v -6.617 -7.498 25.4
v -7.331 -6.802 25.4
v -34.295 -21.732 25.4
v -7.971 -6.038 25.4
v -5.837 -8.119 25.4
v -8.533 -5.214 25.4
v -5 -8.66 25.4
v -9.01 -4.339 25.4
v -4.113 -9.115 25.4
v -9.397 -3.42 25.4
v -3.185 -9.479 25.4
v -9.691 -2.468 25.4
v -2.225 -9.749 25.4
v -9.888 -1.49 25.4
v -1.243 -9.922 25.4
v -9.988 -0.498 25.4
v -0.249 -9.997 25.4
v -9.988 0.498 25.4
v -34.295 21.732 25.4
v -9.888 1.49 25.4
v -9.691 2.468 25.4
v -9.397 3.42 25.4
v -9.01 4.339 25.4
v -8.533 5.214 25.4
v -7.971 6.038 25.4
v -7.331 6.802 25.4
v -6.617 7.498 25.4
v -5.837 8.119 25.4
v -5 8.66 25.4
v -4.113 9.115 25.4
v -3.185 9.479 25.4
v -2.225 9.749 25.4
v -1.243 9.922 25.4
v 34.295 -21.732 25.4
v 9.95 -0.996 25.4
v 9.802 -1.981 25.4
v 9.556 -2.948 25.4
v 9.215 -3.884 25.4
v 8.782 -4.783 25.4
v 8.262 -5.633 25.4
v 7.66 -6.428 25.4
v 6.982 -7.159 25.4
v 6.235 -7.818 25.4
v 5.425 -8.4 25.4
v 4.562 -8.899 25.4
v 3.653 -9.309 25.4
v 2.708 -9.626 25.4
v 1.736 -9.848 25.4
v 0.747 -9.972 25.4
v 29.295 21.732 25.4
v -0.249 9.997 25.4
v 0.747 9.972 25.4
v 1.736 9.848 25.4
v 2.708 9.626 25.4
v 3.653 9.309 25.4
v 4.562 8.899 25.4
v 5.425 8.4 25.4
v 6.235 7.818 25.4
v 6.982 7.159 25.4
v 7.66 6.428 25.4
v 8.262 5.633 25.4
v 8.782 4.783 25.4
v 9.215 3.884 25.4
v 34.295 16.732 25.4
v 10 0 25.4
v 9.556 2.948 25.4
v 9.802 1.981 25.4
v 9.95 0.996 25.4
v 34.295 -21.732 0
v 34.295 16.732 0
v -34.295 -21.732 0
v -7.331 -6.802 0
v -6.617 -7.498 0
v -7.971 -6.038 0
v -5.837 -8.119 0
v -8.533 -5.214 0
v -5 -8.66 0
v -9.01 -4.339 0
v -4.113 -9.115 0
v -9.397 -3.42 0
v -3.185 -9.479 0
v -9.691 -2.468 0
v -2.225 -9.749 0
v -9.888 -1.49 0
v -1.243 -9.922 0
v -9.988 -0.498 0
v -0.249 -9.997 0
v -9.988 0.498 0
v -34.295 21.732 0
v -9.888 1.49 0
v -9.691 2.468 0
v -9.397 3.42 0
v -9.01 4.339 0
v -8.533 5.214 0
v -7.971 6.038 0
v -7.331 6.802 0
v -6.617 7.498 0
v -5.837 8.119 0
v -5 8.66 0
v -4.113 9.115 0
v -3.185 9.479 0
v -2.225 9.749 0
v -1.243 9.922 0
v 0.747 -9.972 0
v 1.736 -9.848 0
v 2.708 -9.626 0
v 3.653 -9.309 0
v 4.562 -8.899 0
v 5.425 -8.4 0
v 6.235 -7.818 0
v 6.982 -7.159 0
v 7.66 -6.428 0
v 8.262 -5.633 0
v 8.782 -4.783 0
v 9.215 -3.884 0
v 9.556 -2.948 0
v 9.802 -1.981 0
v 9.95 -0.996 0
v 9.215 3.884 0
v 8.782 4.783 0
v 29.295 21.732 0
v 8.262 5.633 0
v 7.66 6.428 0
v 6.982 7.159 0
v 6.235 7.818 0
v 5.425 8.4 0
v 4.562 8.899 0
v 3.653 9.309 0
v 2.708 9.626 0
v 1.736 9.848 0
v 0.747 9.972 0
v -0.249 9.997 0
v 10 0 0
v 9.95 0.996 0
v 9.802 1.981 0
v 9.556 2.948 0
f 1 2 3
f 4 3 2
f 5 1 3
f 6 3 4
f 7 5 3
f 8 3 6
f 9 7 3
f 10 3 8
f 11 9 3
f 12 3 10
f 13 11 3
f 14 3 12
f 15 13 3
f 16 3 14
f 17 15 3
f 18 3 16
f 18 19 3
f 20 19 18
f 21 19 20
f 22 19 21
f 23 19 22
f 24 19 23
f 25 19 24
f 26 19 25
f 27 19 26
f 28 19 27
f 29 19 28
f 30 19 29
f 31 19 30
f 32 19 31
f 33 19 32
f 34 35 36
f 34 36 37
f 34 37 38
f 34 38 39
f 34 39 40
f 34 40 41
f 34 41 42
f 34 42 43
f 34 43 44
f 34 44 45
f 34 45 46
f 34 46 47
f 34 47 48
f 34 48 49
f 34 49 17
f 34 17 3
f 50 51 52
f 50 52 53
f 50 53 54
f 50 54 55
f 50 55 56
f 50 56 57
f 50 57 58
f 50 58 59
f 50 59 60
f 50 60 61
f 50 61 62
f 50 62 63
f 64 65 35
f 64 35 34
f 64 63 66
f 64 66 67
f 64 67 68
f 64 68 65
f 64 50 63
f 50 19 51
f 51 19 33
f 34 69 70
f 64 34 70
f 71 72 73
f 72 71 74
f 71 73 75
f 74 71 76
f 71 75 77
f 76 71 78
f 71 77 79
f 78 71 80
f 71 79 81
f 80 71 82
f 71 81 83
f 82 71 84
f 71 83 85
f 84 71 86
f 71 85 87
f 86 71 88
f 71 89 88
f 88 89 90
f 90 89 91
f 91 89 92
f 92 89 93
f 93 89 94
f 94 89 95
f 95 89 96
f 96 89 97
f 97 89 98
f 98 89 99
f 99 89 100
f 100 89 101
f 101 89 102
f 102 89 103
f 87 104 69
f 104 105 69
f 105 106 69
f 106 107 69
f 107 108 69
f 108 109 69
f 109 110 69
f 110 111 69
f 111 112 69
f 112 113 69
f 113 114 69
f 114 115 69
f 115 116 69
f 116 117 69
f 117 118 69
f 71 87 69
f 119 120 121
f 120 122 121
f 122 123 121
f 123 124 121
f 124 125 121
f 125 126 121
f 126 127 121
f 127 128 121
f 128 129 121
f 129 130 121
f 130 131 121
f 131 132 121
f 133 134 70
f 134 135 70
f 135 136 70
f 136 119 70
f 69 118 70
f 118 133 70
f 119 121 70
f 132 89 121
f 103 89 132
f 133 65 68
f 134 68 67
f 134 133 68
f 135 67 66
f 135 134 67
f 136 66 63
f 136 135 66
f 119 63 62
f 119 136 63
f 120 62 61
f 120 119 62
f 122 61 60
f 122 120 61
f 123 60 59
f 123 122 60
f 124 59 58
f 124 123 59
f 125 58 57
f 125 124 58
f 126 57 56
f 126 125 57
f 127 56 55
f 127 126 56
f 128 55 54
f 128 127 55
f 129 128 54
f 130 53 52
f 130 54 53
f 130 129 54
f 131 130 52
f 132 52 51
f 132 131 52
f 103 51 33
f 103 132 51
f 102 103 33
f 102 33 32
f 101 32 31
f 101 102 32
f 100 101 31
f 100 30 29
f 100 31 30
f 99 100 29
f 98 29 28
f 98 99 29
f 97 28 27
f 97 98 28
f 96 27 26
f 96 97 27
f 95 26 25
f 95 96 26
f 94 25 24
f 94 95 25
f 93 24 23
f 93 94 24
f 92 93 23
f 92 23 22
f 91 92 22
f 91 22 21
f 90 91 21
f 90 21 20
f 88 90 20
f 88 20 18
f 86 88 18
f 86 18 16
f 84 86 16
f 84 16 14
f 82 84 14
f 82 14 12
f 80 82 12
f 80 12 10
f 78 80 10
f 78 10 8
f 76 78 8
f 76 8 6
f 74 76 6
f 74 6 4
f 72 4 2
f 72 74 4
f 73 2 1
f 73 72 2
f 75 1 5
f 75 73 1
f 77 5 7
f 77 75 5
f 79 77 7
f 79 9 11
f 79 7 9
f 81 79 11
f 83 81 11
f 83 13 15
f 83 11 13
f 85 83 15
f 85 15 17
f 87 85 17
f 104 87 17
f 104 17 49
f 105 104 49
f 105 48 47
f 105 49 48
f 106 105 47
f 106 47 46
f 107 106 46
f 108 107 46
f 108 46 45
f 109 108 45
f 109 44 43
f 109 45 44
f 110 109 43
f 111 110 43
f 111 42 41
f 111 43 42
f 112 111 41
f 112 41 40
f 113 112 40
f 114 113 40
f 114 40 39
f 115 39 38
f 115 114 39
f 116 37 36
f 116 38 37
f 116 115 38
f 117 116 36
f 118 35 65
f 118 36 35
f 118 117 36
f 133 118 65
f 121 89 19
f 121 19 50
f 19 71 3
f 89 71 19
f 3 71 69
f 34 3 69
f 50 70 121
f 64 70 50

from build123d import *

# Parameters (mm, degrees)
F0_W     = 68.590634
F0_H     = 43.46339
F1_DEPTH = 25.4
F2_D     = 5
F3_R     = 10
F4_DEPTH = 25.401
F5_SIZE  = 5


with BuildPart() as f1:
    # F0 (on Top) → F1 (new body)
    with BuildSketch(Plane.XY):
        Rectangle(F0_W, F0_H)
    extrude(amount=F1_DEPTH)

    # F2 (through all)
    with Locations(Plane(origin=(0, 0, 0), x_dir=(1, 0, 0), z_dir=(0, 0, -1))):
        with Locations((0, 0)):
            Hole(F2_D / 2)

    # F3 (on face) → F4 (cut, through all)
    with BuildSketch(Plane.XY):
        Circle(F3_R)
    extrude(amount=F4_DEPTH, mode=Mode.SUBTRACT)

    # F5
    f5_edges = [f1.edges().sort_by_distance(p)[0] for p in [
        (34.295317, 21.731695, 12.7),
    ]]
    chamfer(f5_edges, length=F5_SIZE)


solid = f1.part
